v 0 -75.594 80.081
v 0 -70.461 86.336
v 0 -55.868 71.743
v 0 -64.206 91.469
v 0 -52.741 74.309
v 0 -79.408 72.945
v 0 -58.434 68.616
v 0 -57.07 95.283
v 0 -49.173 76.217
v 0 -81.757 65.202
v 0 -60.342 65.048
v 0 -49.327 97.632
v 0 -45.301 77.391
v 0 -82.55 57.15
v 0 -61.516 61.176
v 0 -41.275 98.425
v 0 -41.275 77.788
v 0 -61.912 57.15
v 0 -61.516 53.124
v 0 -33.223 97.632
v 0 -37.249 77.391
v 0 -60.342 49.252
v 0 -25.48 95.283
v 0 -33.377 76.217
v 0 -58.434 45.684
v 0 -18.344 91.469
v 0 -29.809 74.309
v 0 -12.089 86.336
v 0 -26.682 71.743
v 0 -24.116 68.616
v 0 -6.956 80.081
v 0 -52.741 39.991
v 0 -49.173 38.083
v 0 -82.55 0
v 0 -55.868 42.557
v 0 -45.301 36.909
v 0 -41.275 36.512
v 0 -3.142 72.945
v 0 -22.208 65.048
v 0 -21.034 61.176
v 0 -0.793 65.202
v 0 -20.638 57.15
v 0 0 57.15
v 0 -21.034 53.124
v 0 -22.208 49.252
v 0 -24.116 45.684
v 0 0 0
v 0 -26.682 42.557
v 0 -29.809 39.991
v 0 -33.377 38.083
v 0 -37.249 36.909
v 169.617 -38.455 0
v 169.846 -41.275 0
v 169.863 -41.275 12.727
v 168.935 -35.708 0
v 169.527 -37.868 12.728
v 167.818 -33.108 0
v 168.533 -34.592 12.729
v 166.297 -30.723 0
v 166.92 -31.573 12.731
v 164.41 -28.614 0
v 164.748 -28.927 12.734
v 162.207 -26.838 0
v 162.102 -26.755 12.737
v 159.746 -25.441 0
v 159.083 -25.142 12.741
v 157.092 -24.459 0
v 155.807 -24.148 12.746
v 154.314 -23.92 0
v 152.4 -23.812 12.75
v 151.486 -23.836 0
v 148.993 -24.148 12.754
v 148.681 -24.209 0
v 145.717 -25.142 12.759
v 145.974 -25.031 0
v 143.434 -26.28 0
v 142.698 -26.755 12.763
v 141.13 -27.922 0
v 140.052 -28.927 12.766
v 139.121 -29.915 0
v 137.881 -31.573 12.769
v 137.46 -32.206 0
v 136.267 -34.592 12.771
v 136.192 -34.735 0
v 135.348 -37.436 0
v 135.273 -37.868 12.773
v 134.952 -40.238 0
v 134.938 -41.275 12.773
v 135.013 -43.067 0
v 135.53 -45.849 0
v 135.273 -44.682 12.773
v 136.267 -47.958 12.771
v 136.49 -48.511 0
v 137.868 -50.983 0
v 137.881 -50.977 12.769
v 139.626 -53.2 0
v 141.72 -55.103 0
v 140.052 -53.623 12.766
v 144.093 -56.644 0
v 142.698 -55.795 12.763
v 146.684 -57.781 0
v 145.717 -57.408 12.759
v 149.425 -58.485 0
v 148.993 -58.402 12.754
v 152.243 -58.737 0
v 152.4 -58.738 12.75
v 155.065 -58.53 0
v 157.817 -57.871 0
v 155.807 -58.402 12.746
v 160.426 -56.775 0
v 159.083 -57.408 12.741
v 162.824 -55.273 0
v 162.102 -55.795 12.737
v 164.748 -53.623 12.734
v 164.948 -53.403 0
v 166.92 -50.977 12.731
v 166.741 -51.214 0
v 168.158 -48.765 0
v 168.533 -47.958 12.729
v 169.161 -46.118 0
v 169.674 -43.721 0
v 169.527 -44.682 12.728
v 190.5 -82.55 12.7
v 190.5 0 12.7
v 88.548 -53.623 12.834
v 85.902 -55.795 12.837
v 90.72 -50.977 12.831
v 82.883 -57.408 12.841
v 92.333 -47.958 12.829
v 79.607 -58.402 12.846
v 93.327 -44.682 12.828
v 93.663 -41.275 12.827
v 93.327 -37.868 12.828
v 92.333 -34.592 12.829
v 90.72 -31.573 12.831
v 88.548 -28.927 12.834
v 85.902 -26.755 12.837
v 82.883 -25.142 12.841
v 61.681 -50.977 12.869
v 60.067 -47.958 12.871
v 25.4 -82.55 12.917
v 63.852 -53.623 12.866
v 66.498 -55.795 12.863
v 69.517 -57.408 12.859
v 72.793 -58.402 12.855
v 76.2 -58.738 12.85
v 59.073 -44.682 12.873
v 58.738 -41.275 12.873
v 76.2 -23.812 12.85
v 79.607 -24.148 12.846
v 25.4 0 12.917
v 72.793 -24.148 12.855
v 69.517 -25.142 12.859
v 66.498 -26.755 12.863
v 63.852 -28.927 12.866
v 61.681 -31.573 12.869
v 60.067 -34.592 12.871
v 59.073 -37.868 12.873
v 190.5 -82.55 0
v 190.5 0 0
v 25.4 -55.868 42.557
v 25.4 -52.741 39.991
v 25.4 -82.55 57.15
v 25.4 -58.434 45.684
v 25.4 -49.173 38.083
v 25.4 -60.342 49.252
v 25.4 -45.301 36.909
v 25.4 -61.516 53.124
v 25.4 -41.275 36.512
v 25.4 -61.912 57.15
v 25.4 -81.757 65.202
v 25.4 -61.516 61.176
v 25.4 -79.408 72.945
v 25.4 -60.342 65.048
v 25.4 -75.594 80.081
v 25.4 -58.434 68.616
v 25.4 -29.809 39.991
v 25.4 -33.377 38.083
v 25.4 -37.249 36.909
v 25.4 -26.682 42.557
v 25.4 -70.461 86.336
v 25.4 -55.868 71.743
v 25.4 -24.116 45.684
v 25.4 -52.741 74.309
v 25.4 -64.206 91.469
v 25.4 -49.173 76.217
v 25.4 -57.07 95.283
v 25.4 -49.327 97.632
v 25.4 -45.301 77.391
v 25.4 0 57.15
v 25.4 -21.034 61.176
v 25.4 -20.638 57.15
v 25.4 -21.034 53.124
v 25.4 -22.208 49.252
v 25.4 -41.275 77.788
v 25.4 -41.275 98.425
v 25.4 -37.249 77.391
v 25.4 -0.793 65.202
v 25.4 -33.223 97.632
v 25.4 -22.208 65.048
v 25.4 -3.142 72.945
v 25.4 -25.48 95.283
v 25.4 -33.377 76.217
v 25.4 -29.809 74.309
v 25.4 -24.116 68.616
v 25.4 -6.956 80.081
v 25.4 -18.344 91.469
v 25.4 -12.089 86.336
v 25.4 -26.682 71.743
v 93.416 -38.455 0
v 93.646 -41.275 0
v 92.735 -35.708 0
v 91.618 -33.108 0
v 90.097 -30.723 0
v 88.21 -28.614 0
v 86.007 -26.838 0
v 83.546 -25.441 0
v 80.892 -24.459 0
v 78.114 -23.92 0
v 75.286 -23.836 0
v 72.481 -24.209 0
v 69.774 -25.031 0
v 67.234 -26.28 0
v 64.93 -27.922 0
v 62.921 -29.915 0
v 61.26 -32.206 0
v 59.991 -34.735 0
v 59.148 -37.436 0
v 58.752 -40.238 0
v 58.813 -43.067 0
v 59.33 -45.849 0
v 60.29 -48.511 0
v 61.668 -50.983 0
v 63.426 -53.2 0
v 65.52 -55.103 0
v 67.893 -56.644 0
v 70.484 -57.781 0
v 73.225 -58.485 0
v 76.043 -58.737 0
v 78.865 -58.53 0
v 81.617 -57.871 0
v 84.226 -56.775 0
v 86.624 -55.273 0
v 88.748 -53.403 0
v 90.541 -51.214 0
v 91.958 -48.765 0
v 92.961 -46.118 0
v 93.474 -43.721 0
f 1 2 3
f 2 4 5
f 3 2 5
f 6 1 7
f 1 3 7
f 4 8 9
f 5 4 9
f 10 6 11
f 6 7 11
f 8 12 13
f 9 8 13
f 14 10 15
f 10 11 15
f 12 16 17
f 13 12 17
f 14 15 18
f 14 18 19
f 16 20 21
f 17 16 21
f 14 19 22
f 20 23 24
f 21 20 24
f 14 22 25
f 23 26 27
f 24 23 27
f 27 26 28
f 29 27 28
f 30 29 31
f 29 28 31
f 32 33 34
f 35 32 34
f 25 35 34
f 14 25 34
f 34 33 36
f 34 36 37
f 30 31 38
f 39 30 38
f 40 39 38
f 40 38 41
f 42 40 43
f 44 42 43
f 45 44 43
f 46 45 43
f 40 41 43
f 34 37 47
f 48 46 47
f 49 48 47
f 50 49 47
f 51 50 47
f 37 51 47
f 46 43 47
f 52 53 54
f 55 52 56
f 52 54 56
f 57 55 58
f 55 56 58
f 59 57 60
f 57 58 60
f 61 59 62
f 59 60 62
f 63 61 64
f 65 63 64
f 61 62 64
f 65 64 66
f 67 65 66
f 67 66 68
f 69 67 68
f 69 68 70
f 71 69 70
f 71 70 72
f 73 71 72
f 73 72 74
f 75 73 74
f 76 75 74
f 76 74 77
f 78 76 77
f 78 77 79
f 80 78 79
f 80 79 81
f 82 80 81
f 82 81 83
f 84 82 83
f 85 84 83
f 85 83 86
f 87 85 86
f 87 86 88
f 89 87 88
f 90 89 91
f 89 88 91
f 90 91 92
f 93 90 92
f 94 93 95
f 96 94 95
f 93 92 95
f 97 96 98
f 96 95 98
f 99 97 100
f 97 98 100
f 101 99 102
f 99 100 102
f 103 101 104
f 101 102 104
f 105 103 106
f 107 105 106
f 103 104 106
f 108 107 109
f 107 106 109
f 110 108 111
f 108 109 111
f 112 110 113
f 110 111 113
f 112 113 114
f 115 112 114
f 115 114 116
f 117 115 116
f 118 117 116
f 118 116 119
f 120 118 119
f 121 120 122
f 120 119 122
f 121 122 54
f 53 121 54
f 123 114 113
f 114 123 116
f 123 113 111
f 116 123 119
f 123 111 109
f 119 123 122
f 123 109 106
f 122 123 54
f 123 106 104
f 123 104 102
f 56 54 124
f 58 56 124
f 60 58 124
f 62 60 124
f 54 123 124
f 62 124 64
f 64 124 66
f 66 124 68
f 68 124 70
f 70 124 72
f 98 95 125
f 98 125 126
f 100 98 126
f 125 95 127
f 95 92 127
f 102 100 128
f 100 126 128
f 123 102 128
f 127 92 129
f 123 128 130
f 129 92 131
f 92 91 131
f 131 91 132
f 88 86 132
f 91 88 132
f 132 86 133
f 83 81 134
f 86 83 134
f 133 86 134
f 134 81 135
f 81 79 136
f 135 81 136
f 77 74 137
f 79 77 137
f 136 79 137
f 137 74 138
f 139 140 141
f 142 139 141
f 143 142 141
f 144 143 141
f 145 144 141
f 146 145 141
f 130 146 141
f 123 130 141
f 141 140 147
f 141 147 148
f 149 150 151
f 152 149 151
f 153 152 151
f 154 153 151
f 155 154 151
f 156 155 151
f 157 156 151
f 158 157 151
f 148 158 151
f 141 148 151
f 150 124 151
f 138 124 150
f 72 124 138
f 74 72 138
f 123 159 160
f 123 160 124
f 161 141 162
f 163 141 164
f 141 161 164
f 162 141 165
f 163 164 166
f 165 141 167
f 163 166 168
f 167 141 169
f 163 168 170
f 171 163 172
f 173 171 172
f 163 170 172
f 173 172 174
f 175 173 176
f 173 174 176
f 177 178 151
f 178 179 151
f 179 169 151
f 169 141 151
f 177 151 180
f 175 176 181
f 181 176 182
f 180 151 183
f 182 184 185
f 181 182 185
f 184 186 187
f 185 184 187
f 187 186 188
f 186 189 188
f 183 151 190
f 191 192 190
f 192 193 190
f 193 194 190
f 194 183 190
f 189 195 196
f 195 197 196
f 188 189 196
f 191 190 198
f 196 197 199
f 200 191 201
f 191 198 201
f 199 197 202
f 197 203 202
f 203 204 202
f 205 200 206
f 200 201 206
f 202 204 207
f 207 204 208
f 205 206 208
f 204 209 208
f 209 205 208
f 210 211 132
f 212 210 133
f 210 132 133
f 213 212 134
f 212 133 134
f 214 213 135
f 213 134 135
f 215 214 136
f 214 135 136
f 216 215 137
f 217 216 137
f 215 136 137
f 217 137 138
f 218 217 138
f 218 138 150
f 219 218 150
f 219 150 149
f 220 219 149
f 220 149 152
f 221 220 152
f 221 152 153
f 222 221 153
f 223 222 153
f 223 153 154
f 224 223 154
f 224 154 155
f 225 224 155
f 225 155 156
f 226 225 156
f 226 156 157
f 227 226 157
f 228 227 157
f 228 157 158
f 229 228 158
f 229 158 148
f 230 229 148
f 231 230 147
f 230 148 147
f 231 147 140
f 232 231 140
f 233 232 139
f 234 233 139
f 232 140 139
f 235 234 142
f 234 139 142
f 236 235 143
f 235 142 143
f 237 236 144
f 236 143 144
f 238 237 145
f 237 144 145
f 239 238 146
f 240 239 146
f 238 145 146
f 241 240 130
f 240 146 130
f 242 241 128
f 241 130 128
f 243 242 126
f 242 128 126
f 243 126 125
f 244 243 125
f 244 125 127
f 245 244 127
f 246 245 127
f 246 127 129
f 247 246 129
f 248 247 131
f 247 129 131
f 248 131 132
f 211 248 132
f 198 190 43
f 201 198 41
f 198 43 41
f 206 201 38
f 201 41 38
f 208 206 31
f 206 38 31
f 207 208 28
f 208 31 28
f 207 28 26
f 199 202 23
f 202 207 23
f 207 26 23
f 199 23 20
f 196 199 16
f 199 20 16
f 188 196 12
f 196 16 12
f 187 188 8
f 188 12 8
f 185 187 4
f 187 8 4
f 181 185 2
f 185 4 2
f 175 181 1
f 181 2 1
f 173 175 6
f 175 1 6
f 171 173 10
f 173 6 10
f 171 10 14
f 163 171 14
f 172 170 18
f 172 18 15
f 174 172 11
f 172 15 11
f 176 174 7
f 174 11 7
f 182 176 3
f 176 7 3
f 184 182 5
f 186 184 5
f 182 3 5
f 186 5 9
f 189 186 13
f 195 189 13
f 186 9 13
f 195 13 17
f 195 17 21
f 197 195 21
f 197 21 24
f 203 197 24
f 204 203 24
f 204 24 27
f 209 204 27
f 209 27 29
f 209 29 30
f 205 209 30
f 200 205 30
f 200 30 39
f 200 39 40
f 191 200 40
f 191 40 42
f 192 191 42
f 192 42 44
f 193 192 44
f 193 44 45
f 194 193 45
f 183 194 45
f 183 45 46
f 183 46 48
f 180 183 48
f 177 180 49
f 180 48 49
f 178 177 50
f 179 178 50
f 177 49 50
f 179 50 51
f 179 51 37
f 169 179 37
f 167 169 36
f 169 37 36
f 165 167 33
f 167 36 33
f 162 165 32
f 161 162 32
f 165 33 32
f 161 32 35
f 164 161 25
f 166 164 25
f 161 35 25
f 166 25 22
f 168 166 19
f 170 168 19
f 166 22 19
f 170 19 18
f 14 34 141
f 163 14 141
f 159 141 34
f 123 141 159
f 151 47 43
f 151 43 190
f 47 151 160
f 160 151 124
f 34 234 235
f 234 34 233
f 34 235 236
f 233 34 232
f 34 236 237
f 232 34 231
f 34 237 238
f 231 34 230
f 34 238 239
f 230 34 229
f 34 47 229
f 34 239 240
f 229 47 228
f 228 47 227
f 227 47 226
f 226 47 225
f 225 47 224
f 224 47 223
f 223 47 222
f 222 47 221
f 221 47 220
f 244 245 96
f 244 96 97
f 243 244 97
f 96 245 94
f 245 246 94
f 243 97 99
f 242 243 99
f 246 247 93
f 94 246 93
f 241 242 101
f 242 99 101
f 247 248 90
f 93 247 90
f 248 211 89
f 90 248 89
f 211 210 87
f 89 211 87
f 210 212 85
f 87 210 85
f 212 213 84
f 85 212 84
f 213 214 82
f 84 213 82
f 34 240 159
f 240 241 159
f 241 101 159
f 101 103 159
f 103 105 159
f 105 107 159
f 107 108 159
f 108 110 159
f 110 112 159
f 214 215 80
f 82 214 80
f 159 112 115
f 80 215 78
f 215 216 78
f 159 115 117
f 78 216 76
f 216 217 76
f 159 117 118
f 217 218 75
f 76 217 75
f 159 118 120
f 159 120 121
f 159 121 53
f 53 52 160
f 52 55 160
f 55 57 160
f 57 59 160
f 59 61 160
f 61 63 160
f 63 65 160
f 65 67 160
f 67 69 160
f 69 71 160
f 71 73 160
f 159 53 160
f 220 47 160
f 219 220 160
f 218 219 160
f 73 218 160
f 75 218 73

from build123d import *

# Parameters (mm, degrees)
F1_DEPTH = 82.55
F2_R     = 20.6375
F3_DEPTH = 152.4
F4_R     = 17.4625
F5_DEPTH = 25.4


with BuildPart() as f1:
    # F0 (on Front) → F1 (new body)
    with BuildSketch(Plane.XZ):
        Polygon((0, 114.3), (0, 0), (190.5, 0), (190.5, 12.7), (25.4, 12.9167754203), (25.4, 114.3), align=None)
    extrude(amount=F1_DEPTH)

    # F2 (on face) → F3 (cut)
    with BuildSketch(Plane(origin=(0, 0, 0), x_dir=(0, -1, 0), z_dir=(-1, 0, 0))):
        with Locations((41.275, 57.15)):
            Circle(F2_R)
        with BuildLine():
            Line((0, 114.3), (0, 57.15))
            ThreePointArc((0, 57.15), (41.275, 98.425), (82.55, 57.15))
            Line((82.55, 57.15), (82.55, 114.3))
            Line((82.55, 114.3), (0, 114.3))
        make_face()
    extrude(amount=-F3_DEPTH, mode=Mode.SUBTRACT)

    # F4 (on face) → F5 (cut)
    with BuildSketch(Plane(origin=(0.0170034164, 0, 12.9501031596), x_dir=(0.999999138, 0, -0.0013129935), z_dir=(0.0013129935, 0, 0.999999138))):
        with Locations((76.1831607755, -41.275)):
            Circle(F4_R)
        with Locations((152.3831607755, -41.275)):
            Circle(F4_R)
    extrude(amount=-F5_DEPTH, mode=Mode.SUBTRACT)


solid = f1.part
